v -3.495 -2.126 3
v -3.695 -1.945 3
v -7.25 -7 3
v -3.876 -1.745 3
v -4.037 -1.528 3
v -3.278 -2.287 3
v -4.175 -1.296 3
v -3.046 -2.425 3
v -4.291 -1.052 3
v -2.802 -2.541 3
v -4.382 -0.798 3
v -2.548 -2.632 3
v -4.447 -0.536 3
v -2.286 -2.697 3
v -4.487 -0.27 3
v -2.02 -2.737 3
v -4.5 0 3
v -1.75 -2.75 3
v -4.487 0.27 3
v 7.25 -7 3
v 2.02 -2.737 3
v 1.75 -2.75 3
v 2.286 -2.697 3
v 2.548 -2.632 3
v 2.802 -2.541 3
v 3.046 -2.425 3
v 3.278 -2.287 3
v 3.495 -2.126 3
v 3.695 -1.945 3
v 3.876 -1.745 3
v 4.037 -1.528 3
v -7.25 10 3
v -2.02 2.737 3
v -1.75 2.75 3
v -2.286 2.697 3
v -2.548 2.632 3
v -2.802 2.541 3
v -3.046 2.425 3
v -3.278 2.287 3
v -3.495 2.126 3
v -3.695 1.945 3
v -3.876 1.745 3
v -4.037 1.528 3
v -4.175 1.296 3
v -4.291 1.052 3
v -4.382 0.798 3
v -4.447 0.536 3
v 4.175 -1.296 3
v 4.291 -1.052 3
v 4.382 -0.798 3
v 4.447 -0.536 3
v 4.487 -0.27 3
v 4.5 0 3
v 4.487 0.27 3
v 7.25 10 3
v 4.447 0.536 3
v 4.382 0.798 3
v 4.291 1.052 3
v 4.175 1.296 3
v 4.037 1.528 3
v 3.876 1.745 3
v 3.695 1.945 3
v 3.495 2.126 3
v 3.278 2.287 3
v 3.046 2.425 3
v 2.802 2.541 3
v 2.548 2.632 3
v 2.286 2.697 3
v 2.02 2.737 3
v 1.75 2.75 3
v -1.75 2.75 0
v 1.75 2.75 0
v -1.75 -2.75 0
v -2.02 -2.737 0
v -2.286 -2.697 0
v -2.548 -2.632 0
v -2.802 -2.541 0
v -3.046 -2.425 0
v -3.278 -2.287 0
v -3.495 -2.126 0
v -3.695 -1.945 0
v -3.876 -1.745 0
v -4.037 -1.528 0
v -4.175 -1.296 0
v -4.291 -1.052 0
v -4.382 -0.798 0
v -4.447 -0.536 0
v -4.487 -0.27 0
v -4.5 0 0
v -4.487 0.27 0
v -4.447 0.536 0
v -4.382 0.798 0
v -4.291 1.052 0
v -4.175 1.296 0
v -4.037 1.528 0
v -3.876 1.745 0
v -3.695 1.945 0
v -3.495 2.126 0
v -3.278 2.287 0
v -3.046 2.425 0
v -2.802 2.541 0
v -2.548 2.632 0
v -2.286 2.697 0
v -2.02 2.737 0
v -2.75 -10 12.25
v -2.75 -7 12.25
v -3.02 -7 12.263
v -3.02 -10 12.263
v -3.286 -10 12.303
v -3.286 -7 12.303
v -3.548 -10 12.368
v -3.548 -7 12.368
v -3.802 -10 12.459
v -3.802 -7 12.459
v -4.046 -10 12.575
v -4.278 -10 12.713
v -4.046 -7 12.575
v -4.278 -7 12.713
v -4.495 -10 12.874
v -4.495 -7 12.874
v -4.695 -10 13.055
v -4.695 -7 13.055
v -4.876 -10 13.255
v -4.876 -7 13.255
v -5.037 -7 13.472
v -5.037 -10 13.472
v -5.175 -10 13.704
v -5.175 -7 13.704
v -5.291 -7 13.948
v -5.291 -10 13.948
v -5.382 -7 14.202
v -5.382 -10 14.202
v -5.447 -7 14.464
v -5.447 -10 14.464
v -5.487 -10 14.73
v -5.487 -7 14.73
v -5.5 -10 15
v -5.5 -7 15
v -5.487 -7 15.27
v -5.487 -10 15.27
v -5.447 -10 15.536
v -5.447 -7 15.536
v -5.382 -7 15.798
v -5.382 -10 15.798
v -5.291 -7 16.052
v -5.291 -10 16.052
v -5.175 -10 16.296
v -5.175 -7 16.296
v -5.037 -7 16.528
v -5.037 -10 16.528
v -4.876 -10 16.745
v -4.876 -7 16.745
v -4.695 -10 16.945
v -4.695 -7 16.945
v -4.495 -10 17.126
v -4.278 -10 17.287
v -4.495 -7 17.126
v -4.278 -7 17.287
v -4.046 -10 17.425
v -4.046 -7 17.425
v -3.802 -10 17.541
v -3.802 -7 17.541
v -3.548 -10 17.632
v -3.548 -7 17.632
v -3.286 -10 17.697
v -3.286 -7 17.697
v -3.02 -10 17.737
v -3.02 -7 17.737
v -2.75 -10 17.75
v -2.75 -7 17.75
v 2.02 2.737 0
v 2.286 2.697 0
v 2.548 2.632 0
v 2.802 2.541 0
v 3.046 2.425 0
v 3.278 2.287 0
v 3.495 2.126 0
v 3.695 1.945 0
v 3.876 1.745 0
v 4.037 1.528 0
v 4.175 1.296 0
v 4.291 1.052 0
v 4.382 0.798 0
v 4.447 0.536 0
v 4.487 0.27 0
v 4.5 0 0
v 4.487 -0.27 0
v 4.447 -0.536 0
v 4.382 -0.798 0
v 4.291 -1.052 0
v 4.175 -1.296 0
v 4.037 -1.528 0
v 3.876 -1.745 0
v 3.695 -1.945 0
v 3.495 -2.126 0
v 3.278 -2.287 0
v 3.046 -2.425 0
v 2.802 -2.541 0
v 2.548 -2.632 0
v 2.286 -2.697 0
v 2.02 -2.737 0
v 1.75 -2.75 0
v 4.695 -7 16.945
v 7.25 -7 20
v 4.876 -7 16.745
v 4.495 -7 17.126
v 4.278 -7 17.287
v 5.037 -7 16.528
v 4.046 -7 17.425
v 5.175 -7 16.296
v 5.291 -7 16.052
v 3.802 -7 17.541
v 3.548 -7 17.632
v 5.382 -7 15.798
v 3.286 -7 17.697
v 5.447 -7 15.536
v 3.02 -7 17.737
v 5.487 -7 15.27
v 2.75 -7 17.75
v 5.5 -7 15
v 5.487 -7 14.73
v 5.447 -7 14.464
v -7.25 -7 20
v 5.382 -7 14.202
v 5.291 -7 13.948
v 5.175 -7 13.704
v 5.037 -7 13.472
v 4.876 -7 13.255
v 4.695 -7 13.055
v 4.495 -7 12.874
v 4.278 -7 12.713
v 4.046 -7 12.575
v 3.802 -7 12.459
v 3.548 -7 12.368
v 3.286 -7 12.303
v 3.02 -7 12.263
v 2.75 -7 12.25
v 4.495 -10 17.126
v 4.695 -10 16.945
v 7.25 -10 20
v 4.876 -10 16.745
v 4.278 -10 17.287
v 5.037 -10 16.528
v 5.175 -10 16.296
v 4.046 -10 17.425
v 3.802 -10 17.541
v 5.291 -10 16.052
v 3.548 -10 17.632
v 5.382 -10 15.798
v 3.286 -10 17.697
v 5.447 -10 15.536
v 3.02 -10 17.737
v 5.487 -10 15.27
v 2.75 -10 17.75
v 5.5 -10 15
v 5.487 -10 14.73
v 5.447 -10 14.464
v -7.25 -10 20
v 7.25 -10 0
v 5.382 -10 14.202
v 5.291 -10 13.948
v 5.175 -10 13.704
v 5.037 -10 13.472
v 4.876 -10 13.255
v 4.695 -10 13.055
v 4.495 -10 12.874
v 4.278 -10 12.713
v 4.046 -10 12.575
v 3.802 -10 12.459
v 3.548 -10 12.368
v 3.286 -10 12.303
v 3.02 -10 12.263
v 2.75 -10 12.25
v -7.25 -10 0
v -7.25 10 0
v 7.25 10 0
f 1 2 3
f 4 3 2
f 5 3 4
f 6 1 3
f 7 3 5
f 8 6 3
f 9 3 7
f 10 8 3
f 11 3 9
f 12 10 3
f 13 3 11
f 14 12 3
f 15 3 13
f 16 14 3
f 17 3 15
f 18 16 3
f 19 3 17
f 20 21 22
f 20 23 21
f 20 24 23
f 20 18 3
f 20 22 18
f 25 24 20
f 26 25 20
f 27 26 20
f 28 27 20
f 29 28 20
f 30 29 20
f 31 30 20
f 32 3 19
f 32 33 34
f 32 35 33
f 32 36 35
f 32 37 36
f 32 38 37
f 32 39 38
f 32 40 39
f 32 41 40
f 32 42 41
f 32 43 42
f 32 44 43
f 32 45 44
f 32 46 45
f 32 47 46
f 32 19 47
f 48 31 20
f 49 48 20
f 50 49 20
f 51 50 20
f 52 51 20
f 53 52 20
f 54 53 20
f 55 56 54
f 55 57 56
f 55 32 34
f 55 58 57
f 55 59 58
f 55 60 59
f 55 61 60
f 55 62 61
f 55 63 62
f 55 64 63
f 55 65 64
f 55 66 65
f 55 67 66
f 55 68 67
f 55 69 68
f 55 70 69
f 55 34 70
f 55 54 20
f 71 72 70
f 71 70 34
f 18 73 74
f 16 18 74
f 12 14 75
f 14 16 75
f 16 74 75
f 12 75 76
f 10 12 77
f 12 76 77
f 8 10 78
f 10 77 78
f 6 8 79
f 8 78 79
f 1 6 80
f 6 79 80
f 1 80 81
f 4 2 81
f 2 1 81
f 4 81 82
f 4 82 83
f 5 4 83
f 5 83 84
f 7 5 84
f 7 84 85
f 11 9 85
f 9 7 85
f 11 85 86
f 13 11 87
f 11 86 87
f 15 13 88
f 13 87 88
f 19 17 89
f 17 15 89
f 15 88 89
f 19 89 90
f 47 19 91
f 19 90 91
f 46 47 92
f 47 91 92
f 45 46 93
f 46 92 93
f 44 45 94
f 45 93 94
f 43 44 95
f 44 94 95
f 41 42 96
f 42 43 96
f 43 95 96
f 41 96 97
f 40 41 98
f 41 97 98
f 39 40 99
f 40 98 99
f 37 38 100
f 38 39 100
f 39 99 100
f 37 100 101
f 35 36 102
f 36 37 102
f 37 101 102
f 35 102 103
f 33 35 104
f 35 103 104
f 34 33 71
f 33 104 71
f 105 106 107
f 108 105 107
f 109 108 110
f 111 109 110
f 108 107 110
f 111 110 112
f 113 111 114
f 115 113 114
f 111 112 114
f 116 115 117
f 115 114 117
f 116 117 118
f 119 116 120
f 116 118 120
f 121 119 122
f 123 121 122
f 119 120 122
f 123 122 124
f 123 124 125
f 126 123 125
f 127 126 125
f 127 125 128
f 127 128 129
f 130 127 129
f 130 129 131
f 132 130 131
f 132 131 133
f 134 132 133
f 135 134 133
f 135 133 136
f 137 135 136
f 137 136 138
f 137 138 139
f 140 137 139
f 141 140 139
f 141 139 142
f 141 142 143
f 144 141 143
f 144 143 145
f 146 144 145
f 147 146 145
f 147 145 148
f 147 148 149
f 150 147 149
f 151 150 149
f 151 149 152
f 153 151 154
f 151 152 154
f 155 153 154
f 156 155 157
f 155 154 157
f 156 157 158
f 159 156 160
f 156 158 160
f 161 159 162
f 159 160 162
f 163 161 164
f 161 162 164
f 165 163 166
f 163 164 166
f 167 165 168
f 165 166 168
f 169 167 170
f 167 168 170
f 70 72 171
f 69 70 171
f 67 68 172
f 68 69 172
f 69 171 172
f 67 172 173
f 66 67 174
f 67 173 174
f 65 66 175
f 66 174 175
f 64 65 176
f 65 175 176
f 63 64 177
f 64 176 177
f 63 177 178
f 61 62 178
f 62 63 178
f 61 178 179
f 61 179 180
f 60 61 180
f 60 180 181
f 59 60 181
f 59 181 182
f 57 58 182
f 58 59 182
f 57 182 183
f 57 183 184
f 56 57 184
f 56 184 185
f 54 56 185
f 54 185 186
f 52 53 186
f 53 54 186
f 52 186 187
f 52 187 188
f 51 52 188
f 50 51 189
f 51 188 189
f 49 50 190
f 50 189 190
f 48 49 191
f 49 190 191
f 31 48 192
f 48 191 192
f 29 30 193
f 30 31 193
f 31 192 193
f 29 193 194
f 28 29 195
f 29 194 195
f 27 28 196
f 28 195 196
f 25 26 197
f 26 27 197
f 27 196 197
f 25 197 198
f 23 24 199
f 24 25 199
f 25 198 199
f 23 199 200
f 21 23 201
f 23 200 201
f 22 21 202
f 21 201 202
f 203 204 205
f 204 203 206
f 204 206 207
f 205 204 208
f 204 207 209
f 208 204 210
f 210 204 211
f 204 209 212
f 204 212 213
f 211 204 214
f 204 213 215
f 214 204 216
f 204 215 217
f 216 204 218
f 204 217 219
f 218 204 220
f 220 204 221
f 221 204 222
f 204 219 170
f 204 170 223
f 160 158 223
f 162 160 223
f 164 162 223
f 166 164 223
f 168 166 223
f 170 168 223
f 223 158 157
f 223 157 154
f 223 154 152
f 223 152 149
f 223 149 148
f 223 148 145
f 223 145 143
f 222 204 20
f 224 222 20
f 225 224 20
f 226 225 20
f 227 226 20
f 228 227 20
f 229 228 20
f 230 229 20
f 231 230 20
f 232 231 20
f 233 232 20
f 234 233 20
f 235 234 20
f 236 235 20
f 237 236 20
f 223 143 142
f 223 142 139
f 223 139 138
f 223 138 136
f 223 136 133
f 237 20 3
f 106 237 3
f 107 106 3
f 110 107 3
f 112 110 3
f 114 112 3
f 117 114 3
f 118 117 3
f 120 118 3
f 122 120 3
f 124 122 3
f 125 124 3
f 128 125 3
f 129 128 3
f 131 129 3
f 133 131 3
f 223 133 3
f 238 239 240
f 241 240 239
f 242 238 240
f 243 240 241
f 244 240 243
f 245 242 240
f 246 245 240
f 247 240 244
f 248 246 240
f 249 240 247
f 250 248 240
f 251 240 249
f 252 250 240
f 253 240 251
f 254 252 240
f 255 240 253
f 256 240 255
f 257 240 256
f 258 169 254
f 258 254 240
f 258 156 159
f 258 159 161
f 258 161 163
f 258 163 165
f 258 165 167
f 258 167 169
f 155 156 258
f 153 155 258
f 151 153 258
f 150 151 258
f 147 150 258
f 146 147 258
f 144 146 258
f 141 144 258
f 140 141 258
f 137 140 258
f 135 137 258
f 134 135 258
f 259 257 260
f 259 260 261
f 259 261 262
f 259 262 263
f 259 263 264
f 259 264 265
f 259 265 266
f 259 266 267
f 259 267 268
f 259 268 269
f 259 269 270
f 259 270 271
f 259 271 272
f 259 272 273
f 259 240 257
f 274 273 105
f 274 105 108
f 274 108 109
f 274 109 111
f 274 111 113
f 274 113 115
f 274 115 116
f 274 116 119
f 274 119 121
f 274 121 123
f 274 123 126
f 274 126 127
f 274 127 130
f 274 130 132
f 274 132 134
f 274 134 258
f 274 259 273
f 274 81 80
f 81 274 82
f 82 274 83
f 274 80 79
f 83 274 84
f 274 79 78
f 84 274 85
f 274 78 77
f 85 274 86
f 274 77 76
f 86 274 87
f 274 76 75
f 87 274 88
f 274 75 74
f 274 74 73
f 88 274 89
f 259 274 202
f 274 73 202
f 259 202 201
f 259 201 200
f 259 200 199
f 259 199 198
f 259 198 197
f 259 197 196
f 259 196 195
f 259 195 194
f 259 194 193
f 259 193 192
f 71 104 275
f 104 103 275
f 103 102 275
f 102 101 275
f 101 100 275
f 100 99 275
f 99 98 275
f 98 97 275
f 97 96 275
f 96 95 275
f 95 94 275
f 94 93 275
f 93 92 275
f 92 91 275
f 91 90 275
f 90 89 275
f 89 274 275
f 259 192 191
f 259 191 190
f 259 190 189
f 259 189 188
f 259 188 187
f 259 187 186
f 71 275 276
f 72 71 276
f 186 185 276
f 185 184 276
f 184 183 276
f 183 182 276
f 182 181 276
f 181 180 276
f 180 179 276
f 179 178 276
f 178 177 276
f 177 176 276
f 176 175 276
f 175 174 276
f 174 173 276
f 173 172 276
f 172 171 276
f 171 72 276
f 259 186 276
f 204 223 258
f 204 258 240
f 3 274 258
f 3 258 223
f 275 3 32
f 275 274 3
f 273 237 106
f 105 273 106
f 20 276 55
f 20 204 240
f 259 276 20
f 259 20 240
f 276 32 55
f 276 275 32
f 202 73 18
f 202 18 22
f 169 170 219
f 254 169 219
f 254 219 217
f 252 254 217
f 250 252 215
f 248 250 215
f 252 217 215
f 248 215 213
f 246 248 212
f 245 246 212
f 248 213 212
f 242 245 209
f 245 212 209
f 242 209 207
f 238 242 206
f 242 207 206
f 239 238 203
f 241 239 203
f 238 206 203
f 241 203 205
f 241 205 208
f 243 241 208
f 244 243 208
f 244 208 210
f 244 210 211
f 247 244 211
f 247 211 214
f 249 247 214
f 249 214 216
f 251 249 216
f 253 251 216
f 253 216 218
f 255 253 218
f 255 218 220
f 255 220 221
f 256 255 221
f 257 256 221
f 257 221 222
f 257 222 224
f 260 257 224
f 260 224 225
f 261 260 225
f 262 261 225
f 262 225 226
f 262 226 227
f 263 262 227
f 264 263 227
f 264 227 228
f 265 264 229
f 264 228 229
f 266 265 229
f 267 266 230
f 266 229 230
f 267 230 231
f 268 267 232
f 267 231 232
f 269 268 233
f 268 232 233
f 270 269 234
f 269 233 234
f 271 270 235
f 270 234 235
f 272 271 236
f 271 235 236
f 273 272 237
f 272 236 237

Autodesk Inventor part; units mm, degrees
ref_plane "YZ Plane" through (0, 0, 0) normal (1, 0, 0) x (0, 1, 0)
ref_plane "XZ Plane" through (0, 0, 0) normal (0, 1, 0) x (-1, 0, 0)
sketch "Sketch1" plane through (0, 0, 0) normal (0, 0, 1) x (1, 0, 0)
  line L0 (-7.25, 10) -> (7.25, 10)
  line L1 (7.25, 10) -> (7.25, -10)
  line L2 (7.25, -10) -> (-7.25, -10)
  line L3 (-7.25, -10) -> (-7.25, 10)
  line L4 (0, 10) -> (0, -10) construction
  line L5 (-7.25, 0) -> (7.25, 0) construction
  line L6 (-1.75, 0) -> (1.75, 0) construction
  line L7 (-1.75, -2.75) -> (1.75, -2.75)
  line L8 (1.75, 2.75) -> (-1.75, 2.75)
  arc A0 (-1.75, 2.75) -> (-1.75, -2.75) centre (-1.75, 0) ccw
  arc A1 (1.75, -2.75) -> (1.75, 2.75) centre (1.75, 0) ccw
  point P0 (0, 0)
  point P1 (0, 0)
  dimension "d0" = 20
  dimension "d1" = 14.5
  dimension "d2" = 5.5
  dimension "d3" = 3.5
  dimension "d4" = 10
extrude "Extrusion1" add sketch "Sketch1" along normal blind 3
sketch "Sketch2" plane through (0, 0, 3) normal (0, 0, 1) x (1, 0, 0)
  line L0 (7.25, -10) -> (7.25, 10) projected
  line L1 (-7.25, -10) -> (7.25, -10)
  line L2 (7.25, -10) -> (7.25, -7)
  line L3 (7.25, -7) -> (-7.25, -7)
  line L4 (-7.25, -7) -> (-7.25, -10)
  point P0 (0, 0)
  dimension "d7" = 3
extrude "Extrusion2" add sketch "Sketch2" along normal blind 17
sketch "Sketch3" plane through (-7.25, -7, 3) normal (0, 1, 0) x (1, 0, 0)
  line L0 (0, 0) -> (0, -17) projected
  line L1 (14.5, -17) -> (0, -17) projected
  line L2 (14.5, 0) -> (14.5, -17) projected
  line L3 (0, -12) -> (14.5, -12) construction
  line L4 (4.5, -12) -> (10, -12) construction
  line L5 (4.5, -14.75) -> (10, -14.75)
  line L6 (10, -9.25) -> (4.5, -9.25)
  arc A0 (4.5, -9.25) -> (4.5, -14.75) centre (4.5, -12) ccw
  arc A1 (10, -14.75) -> (10, -9.25) centre (10, -12) ccw
  point P0 (7.25, 3)
  point P1 (7.25, -12)
  point P2 (7.25, -12)
  dimension "d10" = 5.5
  dimension "d11" = 5.5
  dimension "d12" = 5
extrude "Extrusion3" cut sketch "Sketch3" against normal up to surface (3 mm away)
ref_plane "Work Plane2" through (-5.5, -7, 15) normal (0, 0, 1) x (1, 0, 0)
ref_plane "Work Plane3" through (0, -10, 0) normal (1, 0, 0) x (0, 0, -1)
properties part number "L bracket single"
